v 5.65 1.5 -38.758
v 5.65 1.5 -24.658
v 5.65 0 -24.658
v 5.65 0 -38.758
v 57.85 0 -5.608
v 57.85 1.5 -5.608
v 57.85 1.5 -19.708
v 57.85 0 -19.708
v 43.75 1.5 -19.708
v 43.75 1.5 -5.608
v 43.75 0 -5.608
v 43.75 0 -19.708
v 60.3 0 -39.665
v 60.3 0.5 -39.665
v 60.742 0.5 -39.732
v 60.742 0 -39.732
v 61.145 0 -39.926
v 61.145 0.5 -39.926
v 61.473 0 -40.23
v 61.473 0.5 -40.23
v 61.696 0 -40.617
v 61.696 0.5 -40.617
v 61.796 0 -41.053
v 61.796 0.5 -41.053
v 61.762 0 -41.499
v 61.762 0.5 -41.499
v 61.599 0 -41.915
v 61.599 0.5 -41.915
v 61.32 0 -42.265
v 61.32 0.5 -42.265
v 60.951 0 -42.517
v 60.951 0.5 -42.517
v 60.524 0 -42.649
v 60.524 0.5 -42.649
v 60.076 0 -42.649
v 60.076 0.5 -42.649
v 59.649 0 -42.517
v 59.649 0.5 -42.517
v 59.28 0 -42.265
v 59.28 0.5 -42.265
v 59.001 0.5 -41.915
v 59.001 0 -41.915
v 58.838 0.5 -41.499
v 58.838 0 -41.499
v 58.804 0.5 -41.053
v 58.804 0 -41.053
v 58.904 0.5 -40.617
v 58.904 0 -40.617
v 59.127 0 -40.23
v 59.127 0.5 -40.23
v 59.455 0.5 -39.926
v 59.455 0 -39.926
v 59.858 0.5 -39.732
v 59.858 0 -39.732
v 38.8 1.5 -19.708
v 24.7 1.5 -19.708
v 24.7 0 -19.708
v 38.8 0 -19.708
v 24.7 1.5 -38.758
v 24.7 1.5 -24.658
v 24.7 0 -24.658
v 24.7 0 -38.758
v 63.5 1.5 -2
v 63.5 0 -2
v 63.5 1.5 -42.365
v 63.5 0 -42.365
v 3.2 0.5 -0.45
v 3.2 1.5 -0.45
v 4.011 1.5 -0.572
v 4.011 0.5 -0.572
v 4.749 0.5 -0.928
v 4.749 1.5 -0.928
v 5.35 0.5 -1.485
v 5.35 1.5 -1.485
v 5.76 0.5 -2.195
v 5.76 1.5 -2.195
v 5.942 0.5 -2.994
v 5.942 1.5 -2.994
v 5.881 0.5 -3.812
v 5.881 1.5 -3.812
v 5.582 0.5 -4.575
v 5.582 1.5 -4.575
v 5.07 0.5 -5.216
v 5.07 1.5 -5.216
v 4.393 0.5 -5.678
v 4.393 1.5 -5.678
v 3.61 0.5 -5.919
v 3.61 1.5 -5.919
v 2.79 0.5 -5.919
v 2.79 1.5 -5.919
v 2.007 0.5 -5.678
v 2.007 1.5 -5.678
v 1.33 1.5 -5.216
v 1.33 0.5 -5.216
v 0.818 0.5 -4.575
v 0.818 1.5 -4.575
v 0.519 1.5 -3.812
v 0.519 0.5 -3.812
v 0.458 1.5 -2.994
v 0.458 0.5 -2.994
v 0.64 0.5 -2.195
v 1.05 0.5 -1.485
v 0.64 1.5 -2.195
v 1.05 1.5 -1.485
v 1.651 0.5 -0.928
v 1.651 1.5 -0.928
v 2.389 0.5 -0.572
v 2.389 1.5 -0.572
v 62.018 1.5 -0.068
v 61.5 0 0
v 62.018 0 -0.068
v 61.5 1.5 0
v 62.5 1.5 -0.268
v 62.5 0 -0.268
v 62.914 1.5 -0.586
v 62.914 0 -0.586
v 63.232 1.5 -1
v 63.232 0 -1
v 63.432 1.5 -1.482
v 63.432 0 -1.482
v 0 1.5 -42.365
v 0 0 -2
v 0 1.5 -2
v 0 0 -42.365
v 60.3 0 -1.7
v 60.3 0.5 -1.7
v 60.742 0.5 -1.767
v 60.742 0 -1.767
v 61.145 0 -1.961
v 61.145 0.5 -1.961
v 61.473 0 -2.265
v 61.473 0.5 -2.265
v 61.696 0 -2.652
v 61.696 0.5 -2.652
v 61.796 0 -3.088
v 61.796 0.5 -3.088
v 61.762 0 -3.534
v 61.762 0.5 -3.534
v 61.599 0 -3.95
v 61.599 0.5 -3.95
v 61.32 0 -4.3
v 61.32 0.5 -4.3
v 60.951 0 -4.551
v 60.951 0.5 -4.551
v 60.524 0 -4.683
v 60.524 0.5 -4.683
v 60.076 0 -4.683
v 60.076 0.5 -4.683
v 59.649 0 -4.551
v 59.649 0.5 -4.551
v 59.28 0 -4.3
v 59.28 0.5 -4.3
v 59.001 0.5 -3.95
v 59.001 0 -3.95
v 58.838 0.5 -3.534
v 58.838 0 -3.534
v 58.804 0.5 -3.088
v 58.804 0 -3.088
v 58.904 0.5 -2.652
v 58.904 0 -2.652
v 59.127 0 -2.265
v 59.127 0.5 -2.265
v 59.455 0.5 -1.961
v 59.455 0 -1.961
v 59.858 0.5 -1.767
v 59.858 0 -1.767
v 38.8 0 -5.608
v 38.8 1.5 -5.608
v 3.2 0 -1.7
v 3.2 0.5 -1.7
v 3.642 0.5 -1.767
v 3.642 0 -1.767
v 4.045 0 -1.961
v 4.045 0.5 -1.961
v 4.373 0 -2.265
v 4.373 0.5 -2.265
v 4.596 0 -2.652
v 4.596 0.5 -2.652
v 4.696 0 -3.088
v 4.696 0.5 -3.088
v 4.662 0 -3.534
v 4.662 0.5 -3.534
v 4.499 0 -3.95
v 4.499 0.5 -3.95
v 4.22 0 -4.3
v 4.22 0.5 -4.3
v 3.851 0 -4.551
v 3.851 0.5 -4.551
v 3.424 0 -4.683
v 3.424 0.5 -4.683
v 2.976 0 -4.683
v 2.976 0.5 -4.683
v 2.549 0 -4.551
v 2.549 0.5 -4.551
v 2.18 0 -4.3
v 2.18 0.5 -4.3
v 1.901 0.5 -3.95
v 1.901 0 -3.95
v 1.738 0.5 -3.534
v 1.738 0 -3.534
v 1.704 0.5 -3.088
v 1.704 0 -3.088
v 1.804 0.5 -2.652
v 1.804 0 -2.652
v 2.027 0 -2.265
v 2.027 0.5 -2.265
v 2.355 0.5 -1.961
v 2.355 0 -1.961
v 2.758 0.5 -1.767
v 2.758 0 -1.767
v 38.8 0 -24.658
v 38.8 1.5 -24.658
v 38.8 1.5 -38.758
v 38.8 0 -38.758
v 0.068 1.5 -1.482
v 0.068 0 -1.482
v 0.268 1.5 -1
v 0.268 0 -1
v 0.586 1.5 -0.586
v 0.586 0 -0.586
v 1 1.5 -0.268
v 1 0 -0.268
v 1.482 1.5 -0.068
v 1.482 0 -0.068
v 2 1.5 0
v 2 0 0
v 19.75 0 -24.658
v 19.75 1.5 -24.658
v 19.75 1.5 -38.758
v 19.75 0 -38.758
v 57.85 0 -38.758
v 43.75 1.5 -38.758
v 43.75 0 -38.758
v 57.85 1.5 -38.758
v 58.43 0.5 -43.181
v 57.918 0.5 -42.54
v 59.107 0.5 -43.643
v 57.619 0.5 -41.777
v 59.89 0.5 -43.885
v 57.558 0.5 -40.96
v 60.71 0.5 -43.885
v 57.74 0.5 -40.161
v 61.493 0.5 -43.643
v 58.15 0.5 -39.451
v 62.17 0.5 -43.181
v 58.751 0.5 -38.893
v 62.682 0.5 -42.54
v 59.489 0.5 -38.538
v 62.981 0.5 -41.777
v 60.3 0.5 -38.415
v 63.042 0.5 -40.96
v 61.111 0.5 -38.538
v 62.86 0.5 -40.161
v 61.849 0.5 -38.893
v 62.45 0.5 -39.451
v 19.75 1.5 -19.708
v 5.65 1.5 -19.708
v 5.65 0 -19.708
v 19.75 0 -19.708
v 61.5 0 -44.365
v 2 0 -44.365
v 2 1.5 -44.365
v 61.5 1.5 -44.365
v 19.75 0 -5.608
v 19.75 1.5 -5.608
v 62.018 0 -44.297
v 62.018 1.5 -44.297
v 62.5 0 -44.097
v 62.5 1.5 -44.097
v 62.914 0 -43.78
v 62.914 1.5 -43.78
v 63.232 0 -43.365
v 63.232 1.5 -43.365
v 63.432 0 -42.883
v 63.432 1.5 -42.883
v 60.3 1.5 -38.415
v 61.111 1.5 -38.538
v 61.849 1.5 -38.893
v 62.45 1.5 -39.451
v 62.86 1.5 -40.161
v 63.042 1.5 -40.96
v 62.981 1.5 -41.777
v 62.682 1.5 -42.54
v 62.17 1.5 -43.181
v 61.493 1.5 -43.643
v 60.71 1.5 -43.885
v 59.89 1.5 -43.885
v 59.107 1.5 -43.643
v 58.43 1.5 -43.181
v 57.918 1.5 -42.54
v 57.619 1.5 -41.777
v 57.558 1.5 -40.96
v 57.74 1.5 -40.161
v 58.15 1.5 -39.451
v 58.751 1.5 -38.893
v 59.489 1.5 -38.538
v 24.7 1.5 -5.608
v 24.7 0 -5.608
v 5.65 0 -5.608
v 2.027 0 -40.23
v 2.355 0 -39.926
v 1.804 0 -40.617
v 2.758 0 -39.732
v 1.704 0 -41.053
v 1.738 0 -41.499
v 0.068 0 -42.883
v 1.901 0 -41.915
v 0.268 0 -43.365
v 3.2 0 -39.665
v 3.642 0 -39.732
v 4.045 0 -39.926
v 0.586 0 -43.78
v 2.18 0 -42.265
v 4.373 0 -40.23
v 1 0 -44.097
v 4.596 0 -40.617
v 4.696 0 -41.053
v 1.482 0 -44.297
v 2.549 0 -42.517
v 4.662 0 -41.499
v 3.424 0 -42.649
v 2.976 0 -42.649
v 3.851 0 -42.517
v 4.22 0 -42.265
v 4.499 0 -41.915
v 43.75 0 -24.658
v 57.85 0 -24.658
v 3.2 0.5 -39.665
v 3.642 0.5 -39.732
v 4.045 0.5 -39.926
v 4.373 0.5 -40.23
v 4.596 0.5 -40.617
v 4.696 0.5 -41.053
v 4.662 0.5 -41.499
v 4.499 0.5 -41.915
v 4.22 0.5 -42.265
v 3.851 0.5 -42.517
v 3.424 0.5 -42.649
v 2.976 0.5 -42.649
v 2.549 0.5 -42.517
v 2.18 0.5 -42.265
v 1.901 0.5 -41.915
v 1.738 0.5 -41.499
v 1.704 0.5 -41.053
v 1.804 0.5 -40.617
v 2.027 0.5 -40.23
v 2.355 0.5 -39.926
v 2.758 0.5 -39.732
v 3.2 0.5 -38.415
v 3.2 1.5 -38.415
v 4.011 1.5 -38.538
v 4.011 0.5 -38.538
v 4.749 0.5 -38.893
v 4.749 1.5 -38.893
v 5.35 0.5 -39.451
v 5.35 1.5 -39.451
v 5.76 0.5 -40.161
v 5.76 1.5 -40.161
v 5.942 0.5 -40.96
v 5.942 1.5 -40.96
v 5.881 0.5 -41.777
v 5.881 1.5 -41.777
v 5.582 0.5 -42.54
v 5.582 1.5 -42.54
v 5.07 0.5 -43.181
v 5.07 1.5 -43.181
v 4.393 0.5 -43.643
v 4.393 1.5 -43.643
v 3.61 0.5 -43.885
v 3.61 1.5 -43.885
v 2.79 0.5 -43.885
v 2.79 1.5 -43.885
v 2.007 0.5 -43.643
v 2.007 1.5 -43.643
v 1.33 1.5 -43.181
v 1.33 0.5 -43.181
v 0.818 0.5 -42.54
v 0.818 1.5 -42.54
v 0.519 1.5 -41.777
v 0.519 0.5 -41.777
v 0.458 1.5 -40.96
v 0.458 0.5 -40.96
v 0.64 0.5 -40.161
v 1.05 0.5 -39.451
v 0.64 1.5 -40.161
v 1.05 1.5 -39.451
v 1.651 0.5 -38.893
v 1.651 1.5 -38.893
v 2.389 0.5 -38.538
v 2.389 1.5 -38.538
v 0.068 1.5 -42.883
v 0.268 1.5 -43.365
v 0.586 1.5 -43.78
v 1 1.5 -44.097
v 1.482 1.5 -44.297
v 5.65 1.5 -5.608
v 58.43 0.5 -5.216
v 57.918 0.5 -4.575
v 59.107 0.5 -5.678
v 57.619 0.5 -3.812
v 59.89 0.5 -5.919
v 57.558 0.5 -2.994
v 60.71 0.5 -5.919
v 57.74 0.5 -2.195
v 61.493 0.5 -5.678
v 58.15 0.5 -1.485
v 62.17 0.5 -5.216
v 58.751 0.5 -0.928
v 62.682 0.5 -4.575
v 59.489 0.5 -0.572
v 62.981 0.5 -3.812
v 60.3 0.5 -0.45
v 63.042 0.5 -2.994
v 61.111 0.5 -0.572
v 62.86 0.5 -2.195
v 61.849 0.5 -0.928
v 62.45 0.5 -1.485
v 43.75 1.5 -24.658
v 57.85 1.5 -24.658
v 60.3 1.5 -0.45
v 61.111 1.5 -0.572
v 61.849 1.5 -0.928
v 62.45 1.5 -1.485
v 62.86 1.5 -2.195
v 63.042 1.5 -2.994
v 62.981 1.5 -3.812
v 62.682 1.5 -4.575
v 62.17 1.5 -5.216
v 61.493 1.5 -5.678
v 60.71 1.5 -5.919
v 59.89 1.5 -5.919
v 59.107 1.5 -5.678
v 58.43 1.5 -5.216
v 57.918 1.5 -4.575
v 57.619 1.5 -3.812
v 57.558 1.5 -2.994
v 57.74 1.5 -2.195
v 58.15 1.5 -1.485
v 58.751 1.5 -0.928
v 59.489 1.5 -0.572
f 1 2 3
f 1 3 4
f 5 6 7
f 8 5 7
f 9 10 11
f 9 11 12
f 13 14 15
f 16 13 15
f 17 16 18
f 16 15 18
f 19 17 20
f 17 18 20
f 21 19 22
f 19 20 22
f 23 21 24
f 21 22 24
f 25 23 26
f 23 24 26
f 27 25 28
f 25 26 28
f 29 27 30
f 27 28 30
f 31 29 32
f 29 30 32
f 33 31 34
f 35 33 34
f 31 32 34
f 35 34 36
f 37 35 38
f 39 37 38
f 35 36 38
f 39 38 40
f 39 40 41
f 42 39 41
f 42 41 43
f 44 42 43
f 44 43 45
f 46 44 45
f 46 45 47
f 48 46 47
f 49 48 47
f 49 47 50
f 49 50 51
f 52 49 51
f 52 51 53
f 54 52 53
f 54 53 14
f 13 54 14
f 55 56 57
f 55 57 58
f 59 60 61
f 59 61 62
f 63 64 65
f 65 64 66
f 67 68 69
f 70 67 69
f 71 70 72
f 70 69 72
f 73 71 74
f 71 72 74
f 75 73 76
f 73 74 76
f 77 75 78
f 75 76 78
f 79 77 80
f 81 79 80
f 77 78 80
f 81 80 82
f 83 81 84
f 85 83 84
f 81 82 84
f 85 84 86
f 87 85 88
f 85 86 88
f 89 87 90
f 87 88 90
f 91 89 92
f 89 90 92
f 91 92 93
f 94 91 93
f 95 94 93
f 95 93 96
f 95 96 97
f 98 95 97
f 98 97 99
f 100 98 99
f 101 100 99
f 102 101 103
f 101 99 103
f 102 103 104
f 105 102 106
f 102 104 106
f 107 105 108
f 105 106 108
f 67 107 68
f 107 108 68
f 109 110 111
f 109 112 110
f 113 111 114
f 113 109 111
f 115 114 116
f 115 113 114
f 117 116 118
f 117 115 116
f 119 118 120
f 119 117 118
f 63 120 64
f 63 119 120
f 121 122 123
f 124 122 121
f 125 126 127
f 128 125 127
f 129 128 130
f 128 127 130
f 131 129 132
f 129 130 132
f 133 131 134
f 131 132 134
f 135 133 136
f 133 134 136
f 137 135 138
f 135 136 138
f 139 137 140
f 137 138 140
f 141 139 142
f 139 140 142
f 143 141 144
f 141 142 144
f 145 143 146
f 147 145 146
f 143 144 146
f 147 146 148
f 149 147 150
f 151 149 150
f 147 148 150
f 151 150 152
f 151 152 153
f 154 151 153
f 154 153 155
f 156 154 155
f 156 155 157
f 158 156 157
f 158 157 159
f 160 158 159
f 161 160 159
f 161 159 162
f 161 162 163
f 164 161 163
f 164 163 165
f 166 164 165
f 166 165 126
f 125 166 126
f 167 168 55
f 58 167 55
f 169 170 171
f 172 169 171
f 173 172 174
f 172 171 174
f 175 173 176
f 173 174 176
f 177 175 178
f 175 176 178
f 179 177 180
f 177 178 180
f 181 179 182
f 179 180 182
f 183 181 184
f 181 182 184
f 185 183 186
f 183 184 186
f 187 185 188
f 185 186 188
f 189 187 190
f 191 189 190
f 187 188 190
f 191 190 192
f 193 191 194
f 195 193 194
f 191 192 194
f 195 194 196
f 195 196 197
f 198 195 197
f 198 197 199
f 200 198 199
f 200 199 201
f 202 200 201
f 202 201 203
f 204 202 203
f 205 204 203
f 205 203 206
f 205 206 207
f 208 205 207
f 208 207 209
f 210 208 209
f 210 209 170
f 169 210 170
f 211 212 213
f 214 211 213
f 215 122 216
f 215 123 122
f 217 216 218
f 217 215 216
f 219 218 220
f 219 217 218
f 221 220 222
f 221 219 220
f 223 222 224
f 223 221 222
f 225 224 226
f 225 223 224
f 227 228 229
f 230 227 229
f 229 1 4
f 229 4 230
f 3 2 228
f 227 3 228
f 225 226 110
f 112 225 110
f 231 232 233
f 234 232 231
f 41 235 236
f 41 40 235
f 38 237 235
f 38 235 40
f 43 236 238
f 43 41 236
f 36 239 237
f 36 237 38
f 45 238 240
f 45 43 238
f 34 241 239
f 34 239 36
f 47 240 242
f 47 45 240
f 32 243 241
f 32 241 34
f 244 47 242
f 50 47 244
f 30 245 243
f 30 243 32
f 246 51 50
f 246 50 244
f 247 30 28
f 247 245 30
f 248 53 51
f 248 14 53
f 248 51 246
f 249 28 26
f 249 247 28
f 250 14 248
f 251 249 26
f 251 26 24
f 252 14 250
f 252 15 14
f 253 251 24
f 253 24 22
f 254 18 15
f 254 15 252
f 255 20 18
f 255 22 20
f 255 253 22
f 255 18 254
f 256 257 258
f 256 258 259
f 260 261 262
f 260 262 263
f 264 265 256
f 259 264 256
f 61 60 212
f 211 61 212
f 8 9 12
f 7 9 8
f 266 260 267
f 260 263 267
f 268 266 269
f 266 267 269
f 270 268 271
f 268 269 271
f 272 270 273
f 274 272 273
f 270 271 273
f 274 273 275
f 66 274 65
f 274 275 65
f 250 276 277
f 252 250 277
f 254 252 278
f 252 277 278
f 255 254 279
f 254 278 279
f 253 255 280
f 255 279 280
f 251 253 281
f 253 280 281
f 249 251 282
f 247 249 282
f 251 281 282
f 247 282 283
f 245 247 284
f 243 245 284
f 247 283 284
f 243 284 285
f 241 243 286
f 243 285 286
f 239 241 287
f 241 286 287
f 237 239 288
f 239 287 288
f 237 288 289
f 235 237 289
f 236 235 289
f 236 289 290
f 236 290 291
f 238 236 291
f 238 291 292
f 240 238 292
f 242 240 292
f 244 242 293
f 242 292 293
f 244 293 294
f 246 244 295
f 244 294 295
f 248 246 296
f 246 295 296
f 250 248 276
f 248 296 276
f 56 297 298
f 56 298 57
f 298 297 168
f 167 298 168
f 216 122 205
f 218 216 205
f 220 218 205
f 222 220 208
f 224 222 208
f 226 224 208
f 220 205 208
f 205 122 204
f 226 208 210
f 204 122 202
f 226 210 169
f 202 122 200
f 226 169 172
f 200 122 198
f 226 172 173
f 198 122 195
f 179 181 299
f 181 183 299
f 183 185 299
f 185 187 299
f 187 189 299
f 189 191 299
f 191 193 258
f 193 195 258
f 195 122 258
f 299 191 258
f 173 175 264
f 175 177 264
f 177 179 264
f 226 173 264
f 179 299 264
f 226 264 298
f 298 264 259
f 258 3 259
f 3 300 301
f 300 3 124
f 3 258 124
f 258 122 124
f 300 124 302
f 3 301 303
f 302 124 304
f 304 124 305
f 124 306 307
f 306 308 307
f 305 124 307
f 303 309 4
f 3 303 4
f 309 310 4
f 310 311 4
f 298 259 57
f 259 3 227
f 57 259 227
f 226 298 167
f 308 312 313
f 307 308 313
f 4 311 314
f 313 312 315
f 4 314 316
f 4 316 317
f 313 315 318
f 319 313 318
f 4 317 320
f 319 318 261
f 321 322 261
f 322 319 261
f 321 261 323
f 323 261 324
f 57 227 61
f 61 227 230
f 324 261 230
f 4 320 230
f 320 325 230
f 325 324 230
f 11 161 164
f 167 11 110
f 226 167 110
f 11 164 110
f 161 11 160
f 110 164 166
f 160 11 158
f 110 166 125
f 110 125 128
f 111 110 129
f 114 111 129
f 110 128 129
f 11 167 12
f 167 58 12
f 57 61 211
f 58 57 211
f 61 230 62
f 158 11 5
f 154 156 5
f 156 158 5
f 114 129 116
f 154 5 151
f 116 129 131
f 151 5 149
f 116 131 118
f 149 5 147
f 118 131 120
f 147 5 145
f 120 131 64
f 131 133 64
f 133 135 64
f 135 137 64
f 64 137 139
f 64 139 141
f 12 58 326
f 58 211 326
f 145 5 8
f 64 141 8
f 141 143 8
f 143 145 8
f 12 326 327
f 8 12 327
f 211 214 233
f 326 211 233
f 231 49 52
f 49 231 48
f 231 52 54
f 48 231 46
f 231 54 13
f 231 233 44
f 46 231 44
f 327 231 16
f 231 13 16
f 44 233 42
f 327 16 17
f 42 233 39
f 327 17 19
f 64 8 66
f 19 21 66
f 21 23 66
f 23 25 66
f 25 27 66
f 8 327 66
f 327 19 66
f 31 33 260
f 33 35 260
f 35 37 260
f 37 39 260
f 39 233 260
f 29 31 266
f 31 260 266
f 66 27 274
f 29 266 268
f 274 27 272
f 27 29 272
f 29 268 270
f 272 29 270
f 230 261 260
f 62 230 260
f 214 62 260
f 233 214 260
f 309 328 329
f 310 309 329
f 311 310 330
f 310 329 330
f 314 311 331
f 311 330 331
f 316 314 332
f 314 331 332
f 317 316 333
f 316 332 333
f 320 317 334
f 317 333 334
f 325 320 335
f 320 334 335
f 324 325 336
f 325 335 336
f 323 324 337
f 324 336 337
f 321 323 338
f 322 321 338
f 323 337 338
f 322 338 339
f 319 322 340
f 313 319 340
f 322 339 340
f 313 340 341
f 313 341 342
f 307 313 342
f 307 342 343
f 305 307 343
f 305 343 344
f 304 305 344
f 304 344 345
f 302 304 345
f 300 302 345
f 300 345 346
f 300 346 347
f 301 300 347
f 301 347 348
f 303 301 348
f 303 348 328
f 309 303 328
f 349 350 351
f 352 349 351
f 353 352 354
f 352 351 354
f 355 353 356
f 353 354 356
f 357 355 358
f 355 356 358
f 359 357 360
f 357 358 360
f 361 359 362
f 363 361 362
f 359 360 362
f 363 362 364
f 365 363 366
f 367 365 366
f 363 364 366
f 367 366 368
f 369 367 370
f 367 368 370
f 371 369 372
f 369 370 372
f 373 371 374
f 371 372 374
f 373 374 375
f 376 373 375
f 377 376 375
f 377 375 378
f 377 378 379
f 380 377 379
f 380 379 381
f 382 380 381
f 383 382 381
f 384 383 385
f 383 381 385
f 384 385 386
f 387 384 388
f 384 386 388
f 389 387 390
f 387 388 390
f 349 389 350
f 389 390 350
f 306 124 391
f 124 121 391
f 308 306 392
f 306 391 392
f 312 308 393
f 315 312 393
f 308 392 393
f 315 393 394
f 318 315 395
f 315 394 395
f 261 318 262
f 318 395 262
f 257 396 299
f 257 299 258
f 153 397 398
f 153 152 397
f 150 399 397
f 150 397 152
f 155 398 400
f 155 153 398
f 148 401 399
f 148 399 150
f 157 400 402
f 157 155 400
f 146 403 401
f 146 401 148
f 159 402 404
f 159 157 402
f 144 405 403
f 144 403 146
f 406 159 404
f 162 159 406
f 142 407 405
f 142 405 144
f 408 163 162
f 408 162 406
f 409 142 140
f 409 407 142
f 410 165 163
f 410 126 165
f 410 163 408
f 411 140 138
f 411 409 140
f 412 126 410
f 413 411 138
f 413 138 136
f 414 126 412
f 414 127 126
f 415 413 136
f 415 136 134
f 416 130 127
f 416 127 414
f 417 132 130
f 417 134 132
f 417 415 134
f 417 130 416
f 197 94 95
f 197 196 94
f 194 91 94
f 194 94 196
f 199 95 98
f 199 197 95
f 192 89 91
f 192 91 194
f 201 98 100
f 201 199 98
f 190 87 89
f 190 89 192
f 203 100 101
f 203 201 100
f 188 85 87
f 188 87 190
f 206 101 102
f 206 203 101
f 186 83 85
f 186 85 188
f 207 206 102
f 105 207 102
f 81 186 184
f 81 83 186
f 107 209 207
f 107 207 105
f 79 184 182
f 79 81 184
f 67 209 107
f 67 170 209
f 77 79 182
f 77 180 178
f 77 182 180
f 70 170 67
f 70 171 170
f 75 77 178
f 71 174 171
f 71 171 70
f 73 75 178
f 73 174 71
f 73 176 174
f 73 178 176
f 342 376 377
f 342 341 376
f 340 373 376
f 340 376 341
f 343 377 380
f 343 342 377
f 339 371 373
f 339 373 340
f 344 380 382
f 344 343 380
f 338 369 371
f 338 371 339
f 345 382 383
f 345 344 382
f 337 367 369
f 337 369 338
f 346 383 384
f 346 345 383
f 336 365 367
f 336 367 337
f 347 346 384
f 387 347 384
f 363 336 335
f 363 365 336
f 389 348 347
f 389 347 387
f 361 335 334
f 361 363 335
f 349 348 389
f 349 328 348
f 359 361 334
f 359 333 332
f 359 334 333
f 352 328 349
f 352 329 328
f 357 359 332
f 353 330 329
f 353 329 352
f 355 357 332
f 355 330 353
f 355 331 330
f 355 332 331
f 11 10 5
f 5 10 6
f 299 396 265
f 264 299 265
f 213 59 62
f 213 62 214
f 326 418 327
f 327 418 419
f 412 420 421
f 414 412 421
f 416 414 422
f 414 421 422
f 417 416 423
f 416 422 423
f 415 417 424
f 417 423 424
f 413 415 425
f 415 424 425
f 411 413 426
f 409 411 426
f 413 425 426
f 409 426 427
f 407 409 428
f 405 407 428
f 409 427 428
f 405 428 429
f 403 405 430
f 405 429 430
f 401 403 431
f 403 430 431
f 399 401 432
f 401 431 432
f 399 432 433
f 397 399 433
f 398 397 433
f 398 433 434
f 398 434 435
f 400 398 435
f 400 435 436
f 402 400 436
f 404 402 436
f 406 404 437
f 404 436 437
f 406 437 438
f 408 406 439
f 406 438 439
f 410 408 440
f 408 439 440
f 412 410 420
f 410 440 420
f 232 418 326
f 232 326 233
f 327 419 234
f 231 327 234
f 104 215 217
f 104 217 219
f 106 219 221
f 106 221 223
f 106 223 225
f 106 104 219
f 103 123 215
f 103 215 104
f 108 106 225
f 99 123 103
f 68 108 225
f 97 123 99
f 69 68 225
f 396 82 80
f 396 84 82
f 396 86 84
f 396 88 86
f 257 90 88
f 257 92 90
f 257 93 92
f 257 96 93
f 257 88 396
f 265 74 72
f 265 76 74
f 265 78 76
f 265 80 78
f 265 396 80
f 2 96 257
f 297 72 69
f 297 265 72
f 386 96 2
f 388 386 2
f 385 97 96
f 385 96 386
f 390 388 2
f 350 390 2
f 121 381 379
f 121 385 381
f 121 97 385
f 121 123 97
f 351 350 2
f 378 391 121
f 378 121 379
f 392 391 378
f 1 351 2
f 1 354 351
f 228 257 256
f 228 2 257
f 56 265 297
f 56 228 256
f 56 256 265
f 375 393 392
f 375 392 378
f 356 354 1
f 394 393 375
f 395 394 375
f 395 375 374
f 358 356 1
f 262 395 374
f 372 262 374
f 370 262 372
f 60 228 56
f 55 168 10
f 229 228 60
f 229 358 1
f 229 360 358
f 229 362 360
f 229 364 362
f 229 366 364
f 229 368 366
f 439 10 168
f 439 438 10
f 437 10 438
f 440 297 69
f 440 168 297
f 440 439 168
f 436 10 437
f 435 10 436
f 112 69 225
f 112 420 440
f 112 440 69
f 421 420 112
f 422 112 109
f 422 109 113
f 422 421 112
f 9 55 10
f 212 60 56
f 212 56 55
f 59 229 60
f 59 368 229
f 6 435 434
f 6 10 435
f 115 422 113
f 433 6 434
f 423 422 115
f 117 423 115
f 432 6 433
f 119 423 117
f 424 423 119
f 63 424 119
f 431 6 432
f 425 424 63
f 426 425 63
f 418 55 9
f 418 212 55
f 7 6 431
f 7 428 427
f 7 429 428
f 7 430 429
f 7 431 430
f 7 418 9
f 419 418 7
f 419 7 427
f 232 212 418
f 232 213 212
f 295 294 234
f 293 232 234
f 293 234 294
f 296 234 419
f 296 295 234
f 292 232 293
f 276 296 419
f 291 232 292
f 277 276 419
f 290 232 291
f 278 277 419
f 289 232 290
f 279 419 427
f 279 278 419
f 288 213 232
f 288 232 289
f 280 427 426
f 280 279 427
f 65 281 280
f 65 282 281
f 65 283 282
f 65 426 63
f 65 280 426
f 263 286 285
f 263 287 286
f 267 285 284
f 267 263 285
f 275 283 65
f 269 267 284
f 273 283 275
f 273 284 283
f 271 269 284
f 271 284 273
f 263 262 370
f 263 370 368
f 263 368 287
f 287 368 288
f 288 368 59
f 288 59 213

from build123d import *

# Parameters (mm, degrees)
SKETCH1_W           = 63.5
SKETCH1_H           = 44.36533333
BOSS_EXTRUDE1_DEPTH = 1.5
SKETCH2_R           = 1.5
SKETCH2_W           = 14.1
SKETCH2_H           = 14.1
CUT_EXTRUDE1_DEPTH  = 78.477627748
SKETCH4_R           = 2.75
CUT_EXTRUDE2_DEPTH  = 1
FILLET1_R           = 2


with BuildPart() as part:
    # Sketch1 → Boss-Extrude1 (new body)
    with BuildSketch(Plane(origin=(0, 0, 0), x_dir=(1, 0, 0), z_dir=(0, 1, 0))):
        with Locations((31.75, 22.182666665)):
            Rectangle(SKETCH1_W, SKETCH1_H)
    extrude(amount=BOSS_EXTRUDE1_DEPTH)

    # Sketch2 → Cut-Extrude1 (cut, through all)
    with BuildSketch(Plane(origin=(0, 1.5, 0), x_dir=(1, 0, 0), z_dir=(0, 1, 0))):
        with Locations(Location((3.2, 41.16533333, 0), (0, 0, 270))):
            Circle(SKETCH2_R)
        with Locations(Location((60.3, 41.16533333, 0), (0, 0, 270))):
            Circle(SKETCH2_R)
        with Locations(Location((60.3, 3.2, 0), (0, 0, 270))):
            Circle(SKETCH2_R)
        with Locations(Location((3.2, 3.2, 0), (0, 0, 270))):
            Circle(SKETCH2_R)
        with Locations((12.7, 31.70766667)):
            Rectangle(SKETCH2_W, SKETCH2_H)
        with Locations((31.75, 31.70766667)):
            Rectangle(SKETCH2_W, SKETCH2_H)
        with Locations((50.8, 31.70766667)):
            Rectangle(SKETCH2_W, SKETCH2_H)
        with Locations((12.7, 12.65766667)):
            Rectangle(SKETCH2_W, SKETCH2_H)
        with Locations((31.75, 12.65766667)):
            Rectangle(SKETCH2_W, SKETCH2_H)
        with Locations((50.8, 12.65766667)):
            Rectangle(SKETCH2_W, SKETCH2_H)
    extrude(amount=-CUT_EXTRUDE1_DEPTH, mode=Mode.SUBTRACT)

    # Sketch4 → Cut-Extrude2 (cut)
    with BuildSketch(Plane(origin=(0, 1.5, 0), x_dir=(1, 0, 0), z_dir=(0, 1, 0))):
        with Locations(Location((3.2, 41.16533333, 0), (0, 0, 270))):
            Circle(SKETCH4_R)
        with Locations(Location((60.3, 41.16533333, 0), (0, 0, 270))):
            Circle(SKETCH4_R)
        with Locations(Location((60.3, 3.2, 0), (0, 0, 270))):
            Circle(SKETCH4_R)
        with Locations(Location((3.2, 3.2, 0), (0, 0, 270))):
            Circle(SKETCH4_R)
    extrude(amount=-CUT_EXTRUDE2_DEPTH, mode=Mode.SUBTRACT)

    # Fillet1
    fillet1_edges = [part.edges().sort_by_distance(p)[0] for p in [
        (0, 0.75, -44.36533333),
        (63.5, 0.75, -44.36533333),
        (63.5, 0.75, 0),
        (0, 0.75, 0),
    ]]
    fillet(fillet1_edges, radius=FILLET1_R)


solid = part.part
